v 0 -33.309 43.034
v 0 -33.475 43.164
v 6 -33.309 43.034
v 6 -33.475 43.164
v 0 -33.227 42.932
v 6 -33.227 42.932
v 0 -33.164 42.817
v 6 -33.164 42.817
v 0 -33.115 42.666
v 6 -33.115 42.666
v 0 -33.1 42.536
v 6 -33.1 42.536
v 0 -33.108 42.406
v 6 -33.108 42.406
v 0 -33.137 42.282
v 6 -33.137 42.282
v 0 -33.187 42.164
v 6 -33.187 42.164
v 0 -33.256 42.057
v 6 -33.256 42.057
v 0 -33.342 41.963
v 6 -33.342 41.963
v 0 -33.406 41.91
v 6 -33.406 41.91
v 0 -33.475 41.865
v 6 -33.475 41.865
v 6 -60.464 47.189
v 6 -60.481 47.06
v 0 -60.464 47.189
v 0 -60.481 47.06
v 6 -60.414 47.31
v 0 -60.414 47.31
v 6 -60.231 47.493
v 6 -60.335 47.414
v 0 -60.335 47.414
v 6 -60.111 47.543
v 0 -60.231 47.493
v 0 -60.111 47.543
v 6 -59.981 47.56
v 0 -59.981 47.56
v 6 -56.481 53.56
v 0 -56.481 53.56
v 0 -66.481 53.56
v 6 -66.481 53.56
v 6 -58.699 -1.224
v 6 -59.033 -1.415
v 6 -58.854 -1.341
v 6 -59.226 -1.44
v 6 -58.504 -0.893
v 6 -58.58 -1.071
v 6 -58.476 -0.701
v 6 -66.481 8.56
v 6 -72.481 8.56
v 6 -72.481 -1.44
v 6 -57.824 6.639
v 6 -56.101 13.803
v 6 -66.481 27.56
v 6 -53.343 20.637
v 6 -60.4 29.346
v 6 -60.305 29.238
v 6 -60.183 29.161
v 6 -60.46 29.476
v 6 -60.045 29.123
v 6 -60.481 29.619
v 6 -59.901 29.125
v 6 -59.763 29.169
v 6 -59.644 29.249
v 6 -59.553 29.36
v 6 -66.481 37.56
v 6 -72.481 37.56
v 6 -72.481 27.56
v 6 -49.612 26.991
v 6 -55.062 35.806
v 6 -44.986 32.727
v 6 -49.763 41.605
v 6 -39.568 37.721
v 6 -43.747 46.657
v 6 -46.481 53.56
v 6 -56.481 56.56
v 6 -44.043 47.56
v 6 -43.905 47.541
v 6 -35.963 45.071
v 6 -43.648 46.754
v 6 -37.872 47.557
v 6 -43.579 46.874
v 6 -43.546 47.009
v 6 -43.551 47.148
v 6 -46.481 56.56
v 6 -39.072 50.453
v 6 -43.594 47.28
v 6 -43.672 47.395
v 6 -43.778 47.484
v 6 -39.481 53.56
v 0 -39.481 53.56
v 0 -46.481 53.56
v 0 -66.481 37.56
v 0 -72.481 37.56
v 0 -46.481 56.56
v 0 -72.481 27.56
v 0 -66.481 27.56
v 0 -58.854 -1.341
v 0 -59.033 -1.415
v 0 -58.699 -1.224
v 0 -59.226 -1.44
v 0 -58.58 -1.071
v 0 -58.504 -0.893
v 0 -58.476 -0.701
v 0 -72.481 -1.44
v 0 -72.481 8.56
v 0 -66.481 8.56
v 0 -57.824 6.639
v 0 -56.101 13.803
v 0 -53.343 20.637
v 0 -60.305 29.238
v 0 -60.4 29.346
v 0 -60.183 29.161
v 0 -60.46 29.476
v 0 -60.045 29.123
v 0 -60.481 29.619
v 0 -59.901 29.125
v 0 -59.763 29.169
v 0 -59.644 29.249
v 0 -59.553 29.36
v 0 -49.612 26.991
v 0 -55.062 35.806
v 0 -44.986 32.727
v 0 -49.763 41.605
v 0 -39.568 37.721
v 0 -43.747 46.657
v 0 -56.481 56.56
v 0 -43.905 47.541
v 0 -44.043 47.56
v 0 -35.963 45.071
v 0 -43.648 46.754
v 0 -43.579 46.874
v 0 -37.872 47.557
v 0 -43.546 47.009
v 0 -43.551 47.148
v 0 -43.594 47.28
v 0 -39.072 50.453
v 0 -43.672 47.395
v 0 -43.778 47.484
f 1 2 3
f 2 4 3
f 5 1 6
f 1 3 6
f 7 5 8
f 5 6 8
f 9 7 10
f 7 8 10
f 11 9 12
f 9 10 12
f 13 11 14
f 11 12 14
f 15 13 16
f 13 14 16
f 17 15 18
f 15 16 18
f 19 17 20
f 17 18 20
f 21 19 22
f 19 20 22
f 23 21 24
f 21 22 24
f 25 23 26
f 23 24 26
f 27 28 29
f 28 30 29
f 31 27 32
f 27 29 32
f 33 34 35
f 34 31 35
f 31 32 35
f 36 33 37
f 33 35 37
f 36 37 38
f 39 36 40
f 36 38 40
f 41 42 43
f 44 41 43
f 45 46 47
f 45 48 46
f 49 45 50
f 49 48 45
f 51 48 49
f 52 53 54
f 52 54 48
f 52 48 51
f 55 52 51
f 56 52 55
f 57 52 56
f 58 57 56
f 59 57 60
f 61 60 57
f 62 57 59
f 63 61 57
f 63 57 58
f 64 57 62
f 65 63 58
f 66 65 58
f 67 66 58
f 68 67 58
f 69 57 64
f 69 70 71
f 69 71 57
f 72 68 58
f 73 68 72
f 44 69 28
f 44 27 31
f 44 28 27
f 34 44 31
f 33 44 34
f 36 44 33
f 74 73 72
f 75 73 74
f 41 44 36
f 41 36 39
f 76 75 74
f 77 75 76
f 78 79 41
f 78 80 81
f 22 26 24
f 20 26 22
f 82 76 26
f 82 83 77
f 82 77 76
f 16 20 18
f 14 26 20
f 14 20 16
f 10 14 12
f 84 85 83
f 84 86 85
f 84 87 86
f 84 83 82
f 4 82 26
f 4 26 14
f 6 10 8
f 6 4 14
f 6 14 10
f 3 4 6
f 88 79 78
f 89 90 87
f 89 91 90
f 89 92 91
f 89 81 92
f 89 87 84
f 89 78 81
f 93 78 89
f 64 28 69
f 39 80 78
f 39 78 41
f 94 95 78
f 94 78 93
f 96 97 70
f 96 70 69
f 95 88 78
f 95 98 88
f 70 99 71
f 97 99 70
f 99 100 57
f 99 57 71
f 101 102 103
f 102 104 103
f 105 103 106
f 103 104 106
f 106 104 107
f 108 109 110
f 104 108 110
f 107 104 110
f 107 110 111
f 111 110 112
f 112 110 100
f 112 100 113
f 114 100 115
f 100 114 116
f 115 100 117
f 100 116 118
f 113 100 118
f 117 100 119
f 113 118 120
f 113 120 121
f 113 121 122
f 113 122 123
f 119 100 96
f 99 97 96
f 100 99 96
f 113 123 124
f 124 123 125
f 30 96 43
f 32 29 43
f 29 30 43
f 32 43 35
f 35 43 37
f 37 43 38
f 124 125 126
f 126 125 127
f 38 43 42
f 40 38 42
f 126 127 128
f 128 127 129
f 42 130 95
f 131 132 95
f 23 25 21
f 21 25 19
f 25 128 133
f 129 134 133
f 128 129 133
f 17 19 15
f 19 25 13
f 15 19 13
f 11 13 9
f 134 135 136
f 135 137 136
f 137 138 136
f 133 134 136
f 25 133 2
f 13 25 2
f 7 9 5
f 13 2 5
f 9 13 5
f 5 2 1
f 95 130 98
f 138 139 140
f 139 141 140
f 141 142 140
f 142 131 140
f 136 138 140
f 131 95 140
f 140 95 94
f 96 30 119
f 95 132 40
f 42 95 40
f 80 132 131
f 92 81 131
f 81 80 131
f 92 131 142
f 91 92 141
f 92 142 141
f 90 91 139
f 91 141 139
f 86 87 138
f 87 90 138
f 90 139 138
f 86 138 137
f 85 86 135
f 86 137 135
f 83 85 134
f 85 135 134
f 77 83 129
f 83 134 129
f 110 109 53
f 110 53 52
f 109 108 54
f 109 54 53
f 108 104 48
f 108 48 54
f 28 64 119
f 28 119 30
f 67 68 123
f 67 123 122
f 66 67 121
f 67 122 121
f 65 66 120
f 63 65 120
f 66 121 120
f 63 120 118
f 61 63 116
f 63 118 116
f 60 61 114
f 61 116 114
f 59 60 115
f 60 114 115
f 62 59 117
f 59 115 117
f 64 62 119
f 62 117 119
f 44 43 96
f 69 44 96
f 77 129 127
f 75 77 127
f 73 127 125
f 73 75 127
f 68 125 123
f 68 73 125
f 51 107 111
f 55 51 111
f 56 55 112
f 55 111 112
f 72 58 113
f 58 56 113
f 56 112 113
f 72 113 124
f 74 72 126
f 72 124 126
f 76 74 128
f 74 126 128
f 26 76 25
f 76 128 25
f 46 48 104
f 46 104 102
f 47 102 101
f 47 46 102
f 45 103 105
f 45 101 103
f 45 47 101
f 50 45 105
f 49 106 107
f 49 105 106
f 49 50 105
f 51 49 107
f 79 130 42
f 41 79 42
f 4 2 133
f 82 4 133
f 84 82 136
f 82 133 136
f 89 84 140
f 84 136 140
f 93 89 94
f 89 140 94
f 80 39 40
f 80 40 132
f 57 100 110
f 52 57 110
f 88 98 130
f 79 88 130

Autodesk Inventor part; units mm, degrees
ref_plane "YZ Plane" through (0, 0, 0) normal (1, 0, 0) x (0, 1, 0)
ref_plane "XZ Plane" through (0, 0, 0) normal (0, 1, 0) x (-1, 0, 0)
ref_plane "XY Plane" through (0, 0, 0) normal (0, 0, 1) x (1, 0, 0)
sketch "Sketch1" plane through (0, 0, 0) normal (1, 0, 0) x (0, 1, 0)
  circle A0 centre (-8.4812, -1.44) radius 50 construction
  line L0 (-46.4812, 56.56) -> (-56.4812, 56.56)
  line L1 (-56.4812, 56.56) -> (-56.4812, 53.56)
  line L2 (-66.4812, 27.56) -> (-72.4812, 27.56)
  line L3 (-72.4812, 27.56) -> (-72.4812, 37.56)
  line L4 (-72.4812, 37.56) -> (-66.4812, 37.56)
  arc A1 (-44.3506, 33.3937) -> (-32.2509, 42.5487) centre (-8.4812, -1.44) ccw construction
  line L5 (-66.4812, 53.56) -> (-66.4812, 37.56)
  line L6 (-56.4812, 53.56) -> (-66.4812, 53.56)
  line L7 (-66.4812, 53.56) -> (-45.3047, 32.3835) construction
  line L8 (-58.4812, -1.44) -> (-65.4812, -1.44)
  line L9 (-65.4812, -1.44) -> (-72.4812, -1.44)
  line L10 (-72.4812, -1.44) -> (-72.4812, 8.56)
  line L11 (-72.4812, 8.56) -> (-66.4812, 8.56)
  line L12 (-66.4812, 27.56) -> (-66.4812, 8.56)
  arc A2 (-32.2509, 42.5487) -> (-58.4812, -1.44) centre (-8.4812, -1.44) ccw
  arc A3 (-39.4812, 53.56) -> (-32.2509, 42.5487) centre (-27.4812, 53.56) ccw
  line L13 (-46.4812, 56.56) -> (-46.4812, 53.56)
  line L14 (-46.4812, 53.56) -> (-39.4812, 53.56)
  line L15 (-48.4406, 53.56) -> (-18.7746, 53.56) construction
  point P0 (-30.5194, 43.4412)
  dimension "d6" = 50
  dimension "d8" = 10
  dimension "d10" = 3
  dimension "d11" = 10
  dimension "d12" = 6
  dimension "d18" = 10
  dimension "d23" = 45
  dimension "d30" = 10
  dimension "d31" = 6
  dimension "d32" = 19
  dimension "d38" = 58
  dimension "d50" = 7
  dimension "d51" = 16
  dimension "d57" = 12
  dimension "d69" = 7
  dimension "d70" = 7
extrude "Extrusion2" add sketch "Sketch1" along normal blind 6
fillet "Fillet3" radius 0.75 2 edges at (3, -32.2509, 42.5487) (3, -58.4812, -1.44)
sketch "Sketch2" plane through (6, 0, 0) normal (1, 0, 0) x (0, 0, -1)
  line L0 (-27.7662, -60.4812) -> (-47.56, -60.4812)
  line L1 (-47.56, -60.4812) -> (-47.56, -42.4812)
  line L2 (-53.56, -56.4812) -> (-53.56, -66.4812) projected
  line L3 (-53.56, -66.4812) -> (-37.56, -66.4812) projected
  line L4 (-56.56, -46.4812) -> (-56.56, -56.4812) projected
  arc A0 (-41.8649, -33.4749) -> (0.701, -58.4757) centre (1.44, -8.4812) ccw projected
  arc A1 (-47.56, -42.4812) -> (-27.7662, -60.4812) centre (1.44, -8.4812) ccw
  point P0 (-53.56, -39.4812)
  dimension "d42" = 6
  dimension "d43" = 6
  dimension "d73" = 3
extrude "Extrusion5" cut sketch "Sketch2" against normal blind 10
fillet "Fillet7" radius 0.5 3 edges at (3, -42.4812, 47.56) (3, -60.4812, 47.56) (3, -60.4812, 27.7662)
properties part number "Harness Pusher 2"
